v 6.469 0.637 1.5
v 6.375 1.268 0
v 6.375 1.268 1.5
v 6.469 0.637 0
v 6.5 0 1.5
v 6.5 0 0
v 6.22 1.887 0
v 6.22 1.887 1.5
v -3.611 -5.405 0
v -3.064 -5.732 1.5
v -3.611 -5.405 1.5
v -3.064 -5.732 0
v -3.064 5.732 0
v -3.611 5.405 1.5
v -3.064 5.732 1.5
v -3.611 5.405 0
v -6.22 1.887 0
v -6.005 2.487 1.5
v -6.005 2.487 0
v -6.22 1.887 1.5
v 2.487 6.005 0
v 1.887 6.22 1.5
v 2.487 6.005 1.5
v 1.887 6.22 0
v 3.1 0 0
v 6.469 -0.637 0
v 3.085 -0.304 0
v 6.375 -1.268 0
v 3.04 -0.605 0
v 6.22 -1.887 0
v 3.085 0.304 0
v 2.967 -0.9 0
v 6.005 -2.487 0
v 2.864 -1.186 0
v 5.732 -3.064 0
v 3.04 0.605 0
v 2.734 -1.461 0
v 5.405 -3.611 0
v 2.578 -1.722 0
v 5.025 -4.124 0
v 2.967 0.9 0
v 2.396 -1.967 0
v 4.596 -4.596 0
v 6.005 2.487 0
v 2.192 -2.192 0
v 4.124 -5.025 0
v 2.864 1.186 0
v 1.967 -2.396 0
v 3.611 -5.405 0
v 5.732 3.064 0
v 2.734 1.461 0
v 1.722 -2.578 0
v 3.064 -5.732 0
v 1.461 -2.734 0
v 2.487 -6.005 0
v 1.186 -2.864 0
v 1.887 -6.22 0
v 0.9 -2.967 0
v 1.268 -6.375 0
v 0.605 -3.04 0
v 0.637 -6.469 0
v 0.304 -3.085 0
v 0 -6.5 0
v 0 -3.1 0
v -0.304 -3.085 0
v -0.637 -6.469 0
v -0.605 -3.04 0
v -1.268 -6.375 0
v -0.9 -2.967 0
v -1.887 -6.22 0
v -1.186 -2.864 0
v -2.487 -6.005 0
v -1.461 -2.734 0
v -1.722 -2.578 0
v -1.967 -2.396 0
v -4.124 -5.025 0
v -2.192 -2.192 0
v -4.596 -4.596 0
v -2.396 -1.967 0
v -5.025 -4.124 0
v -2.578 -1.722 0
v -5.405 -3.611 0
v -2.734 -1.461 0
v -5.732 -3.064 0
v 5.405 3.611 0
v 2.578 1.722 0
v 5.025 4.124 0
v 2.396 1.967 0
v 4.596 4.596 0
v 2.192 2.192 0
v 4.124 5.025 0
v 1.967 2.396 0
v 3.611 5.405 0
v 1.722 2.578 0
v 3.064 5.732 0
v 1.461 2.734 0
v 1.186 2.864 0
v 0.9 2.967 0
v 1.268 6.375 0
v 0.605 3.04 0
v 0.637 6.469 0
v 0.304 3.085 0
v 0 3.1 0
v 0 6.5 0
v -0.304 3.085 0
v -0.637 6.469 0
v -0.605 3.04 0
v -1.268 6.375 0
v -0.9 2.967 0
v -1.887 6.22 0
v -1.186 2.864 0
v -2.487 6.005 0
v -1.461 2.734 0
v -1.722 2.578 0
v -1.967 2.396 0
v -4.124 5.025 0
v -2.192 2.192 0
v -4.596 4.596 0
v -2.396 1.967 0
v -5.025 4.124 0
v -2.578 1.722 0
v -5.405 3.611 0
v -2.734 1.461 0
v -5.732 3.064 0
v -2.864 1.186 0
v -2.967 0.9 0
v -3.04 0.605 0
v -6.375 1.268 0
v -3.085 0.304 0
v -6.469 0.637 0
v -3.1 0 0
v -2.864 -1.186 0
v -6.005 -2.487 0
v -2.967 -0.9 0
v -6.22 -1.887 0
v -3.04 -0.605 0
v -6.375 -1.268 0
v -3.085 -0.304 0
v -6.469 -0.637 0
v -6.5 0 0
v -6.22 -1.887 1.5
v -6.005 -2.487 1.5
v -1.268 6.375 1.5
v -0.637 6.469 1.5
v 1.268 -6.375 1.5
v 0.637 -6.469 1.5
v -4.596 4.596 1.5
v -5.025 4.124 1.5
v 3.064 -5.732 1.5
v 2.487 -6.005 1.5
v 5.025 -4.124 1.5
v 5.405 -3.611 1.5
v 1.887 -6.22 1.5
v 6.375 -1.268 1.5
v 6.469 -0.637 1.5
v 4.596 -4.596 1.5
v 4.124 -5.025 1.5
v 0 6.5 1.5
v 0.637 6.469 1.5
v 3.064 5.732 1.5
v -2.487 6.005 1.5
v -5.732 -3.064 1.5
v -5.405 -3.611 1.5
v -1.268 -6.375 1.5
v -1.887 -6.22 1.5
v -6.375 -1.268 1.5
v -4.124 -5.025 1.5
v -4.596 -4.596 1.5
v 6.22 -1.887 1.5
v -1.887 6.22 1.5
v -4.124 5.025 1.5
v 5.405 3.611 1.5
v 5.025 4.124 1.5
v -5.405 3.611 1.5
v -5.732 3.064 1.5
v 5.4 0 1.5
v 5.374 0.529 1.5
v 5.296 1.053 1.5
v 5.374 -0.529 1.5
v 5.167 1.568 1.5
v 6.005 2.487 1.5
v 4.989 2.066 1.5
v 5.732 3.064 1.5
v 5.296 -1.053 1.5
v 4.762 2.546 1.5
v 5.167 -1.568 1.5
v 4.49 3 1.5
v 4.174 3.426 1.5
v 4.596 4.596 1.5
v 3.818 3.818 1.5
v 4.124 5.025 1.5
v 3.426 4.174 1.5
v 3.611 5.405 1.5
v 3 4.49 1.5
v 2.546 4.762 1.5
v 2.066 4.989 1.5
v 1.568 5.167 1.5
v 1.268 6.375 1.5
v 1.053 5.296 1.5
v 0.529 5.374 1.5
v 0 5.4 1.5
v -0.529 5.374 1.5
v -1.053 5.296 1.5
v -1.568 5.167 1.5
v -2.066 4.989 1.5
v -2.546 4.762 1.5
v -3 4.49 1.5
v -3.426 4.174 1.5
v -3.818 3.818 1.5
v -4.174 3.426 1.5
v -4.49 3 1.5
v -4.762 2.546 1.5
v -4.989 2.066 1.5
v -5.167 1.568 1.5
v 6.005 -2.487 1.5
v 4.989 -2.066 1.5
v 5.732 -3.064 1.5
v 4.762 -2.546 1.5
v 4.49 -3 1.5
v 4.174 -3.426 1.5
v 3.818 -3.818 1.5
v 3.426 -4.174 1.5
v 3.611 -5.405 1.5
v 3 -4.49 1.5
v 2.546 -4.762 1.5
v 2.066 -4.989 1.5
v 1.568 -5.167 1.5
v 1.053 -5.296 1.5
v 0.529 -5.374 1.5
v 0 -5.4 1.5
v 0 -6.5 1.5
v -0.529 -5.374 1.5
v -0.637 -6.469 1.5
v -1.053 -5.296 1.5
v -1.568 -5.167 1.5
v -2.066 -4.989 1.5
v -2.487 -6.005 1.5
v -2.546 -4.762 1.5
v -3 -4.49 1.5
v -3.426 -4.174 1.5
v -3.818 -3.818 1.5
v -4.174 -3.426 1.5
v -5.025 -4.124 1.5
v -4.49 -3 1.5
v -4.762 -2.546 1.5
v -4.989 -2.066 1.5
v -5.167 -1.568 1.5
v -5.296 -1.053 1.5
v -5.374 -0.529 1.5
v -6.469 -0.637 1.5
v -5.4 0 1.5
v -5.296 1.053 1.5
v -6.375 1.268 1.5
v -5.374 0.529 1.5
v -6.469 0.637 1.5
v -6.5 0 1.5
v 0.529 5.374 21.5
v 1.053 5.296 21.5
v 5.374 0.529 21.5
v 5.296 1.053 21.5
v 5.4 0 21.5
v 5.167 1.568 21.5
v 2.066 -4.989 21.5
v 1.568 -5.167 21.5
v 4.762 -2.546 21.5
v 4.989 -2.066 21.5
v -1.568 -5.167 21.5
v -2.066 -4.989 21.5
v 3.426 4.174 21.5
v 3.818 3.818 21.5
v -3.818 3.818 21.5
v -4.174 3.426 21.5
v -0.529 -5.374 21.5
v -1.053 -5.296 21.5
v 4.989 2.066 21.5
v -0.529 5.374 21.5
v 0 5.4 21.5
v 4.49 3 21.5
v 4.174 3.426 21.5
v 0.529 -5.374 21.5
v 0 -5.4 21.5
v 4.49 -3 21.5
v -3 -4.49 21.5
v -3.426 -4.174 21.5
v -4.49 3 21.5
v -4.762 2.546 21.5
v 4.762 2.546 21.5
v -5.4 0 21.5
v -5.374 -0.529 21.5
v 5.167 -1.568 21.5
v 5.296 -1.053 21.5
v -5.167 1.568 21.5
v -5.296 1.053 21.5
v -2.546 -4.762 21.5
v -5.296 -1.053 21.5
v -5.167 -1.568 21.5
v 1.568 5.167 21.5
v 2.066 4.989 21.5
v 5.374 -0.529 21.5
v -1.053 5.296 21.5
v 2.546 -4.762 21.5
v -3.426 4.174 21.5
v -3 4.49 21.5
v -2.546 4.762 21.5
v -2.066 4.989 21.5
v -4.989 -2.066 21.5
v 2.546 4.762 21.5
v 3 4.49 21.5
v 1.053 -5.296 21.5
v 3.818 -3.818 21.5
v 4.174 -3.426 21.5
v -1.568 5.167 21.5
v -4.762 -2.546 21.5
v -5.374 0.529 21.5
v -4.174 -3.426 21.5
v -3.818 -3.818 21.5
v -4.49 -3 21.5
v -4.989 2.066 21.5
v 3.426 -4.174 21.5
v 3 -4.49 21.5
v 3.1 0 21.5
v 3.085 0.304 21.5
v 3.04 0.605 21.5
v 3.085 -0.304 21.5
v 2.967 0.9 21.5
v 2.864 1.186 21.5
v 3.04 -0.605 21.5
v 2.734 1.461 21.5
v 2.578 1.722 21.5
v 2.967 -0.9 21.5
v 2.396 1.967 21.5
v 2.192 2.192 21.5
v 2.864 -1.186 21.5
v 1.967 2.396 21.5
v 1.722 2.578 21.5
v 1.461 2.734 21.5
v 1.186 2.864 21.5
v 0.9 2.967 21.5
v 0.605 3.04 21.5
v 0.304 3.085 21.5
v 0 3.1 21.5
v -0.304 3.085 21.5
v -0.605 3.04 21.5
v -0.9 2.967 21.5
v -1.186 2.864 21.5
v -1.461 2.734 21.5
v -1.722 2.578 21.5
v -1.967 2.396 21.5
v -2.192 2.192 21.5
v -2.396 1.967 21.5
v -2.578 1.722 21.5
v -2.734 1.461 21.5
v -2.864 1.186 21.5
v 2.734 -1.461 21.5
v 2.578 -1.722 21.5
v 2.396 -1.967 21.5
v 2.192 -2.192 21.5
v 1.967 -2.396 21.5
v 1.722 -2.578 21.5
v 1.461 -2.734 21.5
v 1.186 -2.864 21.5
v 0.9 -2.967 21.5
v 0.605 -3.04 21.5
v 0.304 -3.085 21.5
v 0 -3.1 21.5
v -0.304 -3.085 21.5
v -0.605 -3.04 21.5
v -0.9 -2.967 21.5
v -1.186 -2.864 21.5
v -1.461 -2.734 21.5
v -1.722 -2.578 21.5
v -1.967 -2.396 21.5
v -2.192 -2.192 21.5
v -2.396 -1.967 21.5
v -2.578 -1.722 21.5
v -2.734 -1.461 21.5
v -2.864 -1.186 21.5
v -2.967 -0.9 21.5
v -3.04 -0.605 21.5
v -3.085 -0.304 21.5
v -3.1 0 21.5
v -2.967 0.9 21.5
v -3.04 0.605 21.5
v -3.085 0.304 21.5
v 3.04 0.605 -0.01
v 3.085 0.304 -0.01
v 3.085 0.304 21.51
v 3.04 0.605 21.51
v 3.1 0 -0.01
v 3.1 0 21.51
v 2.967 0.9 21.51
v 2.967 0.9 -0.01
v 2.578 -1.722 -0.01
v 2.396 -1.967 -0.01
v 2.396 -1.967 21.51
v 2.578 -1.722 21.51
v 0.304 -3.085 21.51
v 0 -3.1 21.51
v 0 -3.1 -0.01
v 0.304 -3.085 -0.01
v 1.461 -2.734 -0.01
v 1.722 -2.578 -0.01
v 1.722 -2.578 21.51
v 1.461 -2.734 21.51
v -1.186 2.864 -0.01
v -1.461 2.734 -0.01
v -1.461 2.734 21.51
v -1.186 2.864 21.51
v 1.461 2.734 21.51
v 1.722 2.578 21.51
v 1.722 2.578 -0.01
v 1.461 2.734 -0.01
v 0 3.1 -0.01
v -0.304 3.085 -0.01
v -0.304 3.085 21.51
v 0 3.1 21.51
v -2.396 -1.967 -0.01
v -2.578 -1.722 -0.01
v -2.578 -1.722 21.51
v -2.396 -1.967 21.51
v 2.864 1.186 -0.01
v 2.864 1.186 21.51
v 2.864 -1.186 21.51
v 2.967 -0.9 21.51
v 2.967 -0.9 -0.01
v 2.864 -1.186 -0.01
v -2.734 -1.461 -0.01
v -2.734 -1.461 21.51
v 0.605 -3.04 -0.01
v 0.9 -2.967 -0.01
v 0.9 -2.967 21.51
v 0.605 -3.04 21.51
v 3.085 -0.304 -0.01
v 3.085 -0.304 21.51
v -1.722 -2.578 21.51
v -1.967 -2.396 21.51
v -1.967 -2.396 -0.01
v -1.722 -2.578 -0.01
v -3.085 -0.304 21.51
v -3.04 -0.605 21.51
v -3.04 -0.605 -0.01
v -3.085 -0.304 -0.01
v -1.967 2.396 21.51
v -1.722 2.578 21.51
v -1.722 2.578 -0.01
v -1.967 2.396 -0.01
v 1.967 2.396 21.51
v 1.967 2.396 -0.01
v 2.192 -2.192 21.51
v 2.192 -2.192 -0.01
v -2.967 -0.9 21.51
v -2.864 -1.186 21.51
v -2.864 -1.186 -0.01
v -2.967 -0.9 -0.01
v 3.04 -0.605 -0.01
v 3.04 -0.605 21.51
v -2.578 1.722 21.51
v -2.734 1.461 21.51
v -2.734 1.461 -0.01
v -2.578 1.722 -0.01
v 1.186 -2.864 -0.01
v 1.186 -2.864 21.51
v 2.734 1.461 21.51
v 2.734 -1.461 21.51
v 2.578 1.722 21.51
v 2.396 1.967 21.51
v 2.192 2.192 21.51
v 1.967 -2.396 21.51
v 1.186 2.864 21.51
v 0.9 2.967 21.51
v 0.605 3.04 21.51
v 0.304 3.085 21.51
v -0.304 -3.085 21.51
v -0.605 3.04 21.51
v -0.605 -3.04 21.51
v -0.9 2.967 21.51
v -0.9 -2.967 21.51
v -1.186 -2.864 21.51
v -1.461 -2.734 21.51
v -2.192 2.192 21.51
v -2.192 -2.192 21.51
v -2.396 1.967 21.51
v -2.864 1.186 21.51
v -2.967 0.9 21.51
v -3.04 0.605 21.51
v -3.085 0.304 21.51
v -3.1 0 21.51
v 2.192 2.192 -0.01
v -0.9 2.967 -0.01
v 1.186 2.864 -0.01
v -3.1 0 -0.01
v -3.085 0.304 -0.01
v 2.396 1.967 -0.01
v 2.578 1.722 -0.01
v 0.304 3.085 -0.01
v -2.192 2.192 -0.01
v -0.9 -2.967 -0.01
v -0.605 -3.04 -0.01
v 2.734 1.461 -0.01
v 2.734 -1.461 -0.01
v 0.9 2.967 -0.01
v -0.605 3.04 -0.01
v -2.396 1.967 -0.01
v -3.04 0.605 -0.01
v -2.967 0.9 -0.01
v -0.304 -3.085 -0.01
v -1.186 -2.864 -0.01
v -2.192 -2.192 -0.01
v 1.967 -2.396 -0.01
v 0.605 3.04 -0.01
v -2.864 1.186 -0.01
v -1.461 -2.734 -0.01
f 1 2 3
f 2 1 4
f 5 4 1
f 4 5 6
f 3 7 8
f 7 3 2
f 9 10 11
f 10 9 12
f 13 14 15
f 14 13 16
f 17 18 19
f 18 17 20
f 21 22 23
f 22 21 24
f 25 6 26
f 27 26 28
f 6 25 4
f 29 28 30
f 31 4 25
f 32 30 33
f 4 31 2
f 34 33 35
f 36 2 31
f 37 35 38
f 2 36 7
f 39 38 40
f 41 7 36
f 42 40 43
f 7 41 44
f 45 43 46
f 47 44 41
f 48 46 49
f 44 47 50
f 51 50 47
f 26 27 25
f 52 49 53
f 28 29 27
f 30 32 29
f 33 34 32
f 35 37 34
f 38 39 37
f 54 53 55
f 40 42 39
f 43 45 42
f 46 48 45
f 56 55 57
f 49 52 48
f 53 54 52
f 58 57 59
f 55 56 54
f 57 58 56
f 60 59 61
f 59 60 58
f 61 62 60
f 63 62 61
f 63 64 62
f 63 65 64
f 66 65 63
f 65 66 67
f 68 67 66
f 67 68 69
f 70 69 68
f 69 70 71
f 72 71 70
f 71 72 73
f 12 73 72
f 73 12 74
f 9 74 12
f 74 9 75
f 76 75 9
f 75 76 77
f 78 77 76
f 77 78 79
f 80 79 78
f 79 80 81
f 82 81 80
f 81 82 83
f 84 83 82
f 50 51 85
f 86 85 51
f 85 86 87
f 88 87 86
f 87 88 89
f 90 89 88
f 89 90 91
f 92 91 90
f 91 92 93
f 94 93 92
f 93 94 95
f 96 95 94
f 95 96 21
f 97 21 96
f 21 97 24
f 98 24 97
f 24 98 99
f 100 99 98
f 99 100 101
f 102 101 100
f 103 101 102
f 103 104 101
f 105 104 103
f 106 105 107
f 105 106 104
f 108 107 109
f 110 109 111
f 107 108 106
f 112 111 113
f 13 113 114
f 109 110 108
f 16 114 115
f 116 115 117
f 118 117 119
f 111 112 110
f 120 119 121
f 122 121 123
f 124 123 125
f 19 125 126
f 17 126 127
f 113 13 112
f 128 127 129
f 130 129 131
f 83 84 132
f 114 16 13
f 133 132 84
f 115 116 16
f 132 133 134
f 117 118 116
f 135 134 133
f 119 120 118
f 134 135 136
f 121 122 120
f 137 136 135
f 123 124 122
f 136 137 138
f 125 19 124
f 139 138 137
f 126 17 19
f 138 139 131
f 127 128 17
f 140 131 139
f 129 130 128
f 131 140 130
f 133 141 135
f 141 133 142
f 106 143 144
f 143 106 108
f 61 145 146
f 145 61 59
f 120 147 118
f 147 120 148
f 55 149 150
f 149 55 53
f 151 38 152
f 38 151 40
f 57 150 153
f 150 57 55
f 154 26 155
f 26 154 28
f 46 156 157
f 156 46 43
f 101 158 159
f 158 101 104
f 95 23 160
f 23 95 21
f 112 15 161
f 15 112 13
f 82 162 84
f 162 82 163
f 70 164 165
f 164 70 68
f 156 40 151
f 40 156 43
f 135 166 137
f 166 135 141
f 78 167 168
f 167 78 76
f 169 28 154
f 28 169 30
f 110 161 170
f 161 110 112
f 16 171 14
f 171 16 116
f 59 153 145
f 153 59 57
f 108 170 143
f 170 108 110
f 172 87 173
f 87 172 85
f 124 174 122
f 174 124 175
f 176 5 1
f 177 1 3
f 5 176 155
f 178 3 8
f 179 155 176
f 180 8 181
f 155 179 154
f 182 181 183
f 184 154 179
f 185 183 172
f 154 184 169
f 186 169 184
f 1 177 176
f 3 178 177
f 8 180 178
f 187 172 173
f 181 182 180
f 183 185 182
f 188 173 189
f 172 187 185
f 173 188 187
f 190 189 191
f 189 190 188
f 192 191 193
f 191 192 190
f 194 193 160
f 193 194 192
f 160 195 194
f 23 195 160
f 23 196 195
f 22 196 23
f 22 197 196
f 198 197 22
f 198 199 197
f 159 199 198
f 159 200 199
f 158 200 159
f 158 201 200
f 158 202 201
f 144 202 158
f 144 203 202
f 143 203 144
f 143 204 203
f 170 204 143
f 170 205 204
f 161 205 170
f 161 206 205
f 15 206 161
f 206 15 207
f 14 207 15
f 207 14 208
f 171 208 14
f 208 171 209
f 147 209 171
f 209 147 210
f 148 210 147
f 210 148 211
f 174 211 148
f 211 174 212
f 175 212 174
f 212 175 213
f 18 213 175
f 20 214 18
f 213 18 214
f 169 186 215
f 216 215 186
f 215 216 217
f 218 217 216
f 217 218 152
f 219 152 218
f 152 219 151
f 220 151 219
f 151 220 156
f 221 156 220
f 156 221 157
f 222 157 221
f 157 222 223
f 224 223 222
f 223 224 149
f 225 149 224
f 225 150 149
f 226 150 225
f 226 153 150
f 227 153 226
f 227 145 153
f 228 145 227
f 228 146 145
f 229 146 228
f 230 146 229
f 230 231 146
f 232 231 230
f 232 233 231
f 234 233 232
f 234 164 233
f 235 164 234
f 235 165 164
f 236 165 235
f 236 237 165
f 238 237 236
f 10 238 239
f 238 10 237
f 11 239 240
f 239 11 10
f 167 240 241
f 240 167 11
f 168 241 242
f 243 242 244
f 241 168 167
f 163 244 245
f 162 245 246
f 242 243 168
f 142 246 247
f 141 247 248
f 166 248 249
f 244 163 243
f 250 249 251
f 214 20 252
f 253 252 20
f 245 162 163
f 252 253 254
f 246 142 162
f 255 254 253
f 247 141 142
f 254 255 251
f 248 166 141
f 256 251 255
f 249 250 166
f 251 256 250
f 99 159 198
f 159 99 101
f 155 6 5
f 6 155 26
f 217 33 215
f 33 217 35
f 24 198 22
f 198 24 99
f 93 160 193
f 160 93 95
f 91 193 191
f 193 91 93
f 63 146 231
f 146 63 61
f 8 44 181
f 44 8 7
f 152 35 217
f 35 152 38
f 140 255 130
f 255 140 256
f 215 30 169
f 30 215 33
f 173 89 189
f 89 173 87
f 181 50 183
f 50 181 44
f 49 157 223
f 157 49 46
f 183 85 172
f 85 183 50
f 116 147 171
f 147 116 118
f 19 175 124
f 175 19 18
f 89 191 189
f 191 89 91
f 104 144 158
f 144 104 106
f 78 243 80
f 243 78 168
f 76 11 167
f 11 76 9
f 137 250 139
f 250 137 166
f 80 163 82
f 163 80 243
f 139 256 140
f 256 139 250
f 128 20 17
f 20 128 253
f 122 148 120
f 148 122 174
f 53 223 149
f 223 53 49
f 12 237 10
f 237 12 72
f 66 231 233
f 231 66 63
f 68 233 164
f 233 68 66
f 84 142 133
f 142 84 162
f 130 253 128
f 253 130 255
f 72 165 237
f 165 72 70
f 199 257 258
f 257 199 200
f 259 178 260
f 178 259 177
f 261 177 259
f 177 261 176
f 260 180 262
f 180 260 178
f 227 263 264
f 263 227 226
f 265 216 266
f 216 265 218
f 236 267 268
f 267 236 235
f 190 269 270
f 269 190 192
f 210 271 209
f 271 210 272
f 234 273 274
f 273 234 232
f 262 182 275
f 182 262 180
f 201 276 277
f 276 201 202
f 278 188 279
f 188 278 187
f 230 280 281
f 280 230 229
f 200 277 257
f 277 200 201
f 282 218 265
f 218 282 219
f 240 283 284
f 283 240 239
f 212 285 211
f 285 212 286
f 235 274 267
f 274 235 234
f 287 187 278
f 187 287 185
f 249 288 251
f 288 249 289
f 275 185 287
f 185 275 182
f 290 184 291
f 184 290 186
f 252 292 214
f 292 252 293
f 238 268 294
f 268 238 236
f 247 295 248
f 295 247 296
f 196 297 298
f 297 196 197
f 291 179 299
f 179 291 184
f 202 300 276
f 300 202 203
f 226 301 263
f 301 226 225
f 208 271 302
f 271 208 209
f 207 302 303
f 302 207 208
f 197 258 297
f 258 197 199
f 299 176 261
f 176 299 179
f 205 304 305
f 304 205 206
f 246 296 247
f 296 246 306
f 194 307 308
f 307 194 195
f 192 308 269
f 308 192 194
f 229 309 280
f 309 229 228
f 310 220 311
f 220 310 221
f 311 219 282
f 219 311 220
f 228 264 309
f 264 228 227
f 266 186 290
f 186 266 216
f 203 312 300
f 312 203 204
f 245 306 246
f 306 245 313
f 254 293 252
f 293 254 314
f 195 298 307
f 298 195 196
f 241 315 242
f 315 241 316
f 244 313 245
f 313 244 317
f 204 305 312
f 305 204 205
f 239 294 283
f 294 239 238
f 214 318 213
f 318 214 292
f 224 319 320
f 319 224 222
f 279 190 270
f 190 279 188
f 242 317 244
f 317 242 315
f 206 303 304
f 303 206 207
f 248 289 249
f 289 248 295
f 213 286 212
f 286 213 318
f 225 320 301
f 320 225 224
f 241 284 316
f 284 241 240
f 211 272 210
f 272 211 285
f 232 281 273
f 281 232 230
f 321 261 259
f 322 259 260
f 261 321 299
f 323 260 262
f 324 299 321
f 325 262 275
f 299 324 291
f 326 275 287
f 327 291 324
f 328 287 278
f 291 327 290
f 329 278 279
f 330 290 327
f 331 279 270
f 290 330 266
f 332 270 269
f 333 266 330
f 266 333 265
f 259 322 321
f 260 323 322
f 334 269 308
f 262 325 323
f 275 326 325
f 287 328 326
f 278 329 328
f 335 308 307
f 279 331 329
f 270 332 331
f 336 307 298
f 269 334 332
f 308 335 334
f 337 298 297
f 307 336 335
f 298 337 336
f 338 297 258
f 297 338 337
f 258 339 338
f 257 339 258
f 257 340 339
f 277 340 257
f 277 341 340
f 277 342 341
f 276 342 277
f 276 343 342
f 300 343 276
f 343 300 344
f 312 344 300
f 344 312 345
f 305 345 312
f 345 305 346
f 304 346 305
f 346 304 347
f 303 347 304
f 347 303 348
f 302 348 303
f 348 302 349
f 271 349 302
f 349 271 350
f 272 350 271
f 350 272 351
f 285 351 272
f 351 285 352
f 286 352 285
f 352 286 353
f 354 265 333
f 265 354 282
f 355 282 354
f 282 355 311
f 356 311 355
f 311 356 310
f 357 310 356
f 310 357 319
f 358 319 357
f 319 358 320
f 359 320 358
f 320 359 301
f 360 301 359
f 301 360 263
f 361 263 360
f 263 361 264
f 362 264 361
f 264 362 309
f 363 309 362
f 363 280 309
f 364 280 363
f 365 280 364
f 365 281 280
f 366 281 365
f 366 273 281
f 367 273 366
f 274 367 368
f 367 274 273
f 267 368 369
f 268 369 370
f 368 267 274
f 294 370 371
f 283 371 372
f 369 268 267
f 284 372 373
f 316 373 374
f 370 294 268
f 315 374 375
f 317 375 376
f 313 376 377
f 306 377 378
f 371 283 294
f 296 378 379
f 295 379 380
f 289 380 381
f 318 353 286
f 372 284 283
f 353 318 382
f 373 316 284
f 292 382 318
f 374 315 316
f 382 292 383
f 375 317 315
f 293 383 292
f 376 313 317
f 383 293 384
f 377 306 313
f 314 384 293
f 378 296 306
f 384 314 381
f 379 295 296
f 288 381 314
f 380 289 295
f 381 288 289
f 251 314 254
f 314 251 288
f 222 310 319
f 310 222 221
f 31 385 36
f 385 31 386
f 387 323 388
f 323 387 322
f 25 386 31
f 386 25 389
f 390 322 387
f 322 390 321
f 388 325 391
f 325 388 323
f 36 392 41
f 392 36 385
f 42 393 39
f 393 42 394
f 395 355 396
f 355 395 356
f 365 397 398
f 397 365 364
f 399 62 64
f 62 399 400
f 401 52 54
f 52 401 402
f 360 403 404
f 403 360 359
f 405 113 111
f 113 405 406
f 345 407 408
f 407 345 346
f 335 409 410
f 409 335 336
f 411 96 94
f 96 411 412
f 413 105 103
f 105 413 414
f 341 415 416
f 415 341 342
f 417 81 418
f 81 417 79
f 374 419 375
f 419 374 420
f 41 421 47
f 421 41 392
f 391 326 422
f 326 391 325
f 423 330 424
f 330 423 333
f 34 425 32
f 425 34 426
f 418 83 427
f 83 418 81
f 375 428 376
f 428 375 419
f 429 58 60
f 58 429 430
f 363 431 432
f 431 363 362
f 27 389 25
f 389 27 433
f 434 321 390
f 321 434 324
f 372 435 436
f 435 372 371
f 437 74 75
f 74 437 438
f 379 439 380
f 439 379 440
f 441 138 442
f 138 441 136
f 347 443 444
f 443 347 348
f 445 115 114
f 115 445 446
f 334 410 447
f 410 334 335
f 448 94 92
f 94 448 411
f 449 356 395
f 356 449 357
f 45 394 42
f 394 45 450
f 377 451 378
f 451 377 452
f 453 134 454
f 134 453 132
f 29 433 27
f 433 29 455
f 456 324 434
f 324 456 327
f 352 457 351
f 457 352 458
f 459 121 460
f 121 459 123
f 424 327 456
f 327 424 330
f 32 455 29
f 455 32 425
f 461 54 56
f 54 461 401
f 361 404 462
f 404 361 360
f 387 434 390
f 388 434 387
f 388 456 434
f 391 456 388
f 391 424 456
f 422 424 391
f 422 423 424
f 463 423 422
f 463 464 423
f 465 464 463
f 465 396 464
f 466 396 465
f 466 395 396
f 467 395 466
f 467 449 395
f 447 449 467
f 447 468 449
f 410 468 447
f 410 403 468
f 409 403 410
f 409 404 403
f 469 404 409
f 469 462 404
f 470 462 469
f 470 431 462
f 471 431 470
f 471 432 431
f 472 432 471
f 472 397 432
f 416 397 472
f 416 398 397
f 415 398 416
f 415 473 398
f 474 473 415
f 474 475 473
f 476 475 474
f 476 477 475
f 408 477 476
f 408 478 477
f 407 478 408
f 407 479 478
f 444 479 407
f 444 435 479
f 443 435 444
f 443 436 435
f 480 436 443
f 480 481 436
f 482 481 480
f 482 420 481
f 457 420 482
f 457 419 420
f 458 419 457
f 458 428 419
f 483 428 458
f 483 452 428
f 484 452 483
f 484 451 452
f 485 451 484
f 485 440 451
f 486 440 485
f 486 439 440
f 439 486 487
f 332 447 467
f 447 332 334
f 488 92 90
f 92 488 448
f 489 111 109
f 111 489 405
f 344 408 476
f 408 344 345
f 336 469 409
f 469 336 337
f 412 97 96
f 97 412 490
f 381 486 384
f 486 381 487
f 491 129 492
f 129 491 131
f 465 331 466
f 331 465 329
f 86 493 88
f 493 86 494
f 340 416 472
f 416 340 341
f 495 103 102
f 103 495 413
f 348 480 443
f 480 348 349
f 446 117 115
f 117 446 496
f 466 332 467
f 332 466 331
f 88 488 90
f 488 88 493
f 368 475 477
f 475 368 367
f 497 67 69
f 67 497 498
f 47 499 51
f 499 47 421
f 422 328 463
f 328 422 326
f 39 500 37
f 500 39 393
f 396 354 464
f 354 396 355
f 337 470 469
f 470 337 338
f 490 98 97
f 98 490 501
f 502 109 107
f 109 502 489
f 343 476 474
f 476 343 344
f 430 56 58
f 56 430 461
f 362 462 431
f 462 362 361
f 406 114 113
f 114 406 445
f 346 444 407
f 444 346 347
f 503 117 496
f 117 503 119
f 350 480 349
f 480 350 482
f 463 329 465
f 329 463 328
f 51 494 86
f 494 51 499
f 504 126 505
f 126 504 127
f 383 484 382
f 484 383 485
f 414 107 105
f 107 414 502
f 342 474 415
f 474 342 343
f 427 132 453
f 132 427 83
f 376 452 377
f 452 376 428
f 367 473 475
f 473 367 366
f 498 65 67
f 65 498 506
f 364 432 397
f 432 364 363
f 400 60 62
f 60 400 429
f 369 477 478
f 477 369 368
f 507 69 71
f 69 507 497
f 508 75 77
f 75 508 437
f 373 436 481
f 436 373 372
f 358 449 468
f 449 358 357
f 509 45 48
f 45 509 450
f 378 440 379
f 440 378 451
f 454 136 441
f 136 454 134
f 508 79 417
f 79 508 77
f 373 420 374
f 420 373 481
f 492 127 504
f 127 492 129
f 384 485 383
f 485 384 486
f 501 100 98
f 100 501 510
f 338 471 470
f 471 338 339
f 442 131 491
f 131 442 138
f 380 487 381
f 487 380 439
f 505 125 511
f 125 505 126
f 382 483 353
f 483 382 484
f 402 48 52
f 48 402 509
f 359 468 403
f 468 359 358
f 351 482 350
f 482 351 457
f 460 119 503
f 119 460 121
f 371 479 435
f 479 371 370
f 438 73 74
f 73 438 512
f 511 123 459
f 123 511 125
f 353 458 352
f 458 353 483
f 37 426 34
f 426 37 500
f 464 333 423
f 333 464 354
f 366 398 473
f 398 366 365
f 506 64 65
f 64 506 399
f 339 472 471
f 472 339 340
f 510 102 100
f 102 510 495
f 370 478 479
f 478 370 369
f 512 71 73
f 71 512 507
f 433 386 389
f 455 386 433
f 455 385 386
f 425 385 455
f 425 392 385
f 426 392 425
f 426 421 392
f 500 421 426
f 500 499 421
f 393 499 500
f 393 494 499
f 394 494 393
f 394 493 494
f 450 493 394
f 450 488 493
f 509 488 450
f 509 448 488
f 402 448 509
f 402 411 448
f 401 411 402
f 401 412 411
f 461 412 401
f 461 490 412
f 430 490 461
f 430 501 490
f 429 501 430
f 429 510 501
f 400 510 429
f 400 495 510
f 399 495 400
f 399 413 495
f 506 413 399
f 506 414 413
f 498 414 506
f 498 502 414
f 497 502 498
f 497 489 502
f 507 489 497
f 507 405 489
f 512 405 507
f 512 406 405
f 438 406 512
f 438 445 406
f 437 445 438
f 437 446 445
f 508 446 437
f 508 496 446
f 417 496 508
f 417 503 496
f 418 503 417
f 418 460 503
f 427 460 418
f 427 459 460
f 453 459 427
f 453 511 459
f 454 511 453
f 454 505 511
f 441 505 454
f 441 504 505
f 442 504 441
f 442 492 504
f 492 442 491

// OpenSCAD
// PCR tube adapter sleeve for 0.2 mL tube in 1.5 mL rack hole
// Print upside down: collar on bed, sleeve body upward

// Dimensions
collar_diameter = 13;        // Outer diameter of collar
collar_height = 1.5;         // Height of collar
sleeve_outer_diameter = 10.8; // Outer diameter of sleeve body
sleeve_height = 21.5;         // Total height of sleeve (from collar base)
bore_diameter = 6.2;          // Diameter of central bore

// Main body
union() {
  // Collar
  cylinder(h = collar_height, d = collar_diameter, center = false, $fn = 64);
  
  // Sleeve body
  translate([0, 0, collar_height]) 
    cylinder(h = sleeve_height - collar_height, d = sleeve_outer_diameter, center = false, $fn = 64);
  
  // Central bore
  translate([0, 0, -0.01]) 
    cylinder(h = sleeve_height + 0.02, d = bore_diameter, center = false, $fn = 64);
}
